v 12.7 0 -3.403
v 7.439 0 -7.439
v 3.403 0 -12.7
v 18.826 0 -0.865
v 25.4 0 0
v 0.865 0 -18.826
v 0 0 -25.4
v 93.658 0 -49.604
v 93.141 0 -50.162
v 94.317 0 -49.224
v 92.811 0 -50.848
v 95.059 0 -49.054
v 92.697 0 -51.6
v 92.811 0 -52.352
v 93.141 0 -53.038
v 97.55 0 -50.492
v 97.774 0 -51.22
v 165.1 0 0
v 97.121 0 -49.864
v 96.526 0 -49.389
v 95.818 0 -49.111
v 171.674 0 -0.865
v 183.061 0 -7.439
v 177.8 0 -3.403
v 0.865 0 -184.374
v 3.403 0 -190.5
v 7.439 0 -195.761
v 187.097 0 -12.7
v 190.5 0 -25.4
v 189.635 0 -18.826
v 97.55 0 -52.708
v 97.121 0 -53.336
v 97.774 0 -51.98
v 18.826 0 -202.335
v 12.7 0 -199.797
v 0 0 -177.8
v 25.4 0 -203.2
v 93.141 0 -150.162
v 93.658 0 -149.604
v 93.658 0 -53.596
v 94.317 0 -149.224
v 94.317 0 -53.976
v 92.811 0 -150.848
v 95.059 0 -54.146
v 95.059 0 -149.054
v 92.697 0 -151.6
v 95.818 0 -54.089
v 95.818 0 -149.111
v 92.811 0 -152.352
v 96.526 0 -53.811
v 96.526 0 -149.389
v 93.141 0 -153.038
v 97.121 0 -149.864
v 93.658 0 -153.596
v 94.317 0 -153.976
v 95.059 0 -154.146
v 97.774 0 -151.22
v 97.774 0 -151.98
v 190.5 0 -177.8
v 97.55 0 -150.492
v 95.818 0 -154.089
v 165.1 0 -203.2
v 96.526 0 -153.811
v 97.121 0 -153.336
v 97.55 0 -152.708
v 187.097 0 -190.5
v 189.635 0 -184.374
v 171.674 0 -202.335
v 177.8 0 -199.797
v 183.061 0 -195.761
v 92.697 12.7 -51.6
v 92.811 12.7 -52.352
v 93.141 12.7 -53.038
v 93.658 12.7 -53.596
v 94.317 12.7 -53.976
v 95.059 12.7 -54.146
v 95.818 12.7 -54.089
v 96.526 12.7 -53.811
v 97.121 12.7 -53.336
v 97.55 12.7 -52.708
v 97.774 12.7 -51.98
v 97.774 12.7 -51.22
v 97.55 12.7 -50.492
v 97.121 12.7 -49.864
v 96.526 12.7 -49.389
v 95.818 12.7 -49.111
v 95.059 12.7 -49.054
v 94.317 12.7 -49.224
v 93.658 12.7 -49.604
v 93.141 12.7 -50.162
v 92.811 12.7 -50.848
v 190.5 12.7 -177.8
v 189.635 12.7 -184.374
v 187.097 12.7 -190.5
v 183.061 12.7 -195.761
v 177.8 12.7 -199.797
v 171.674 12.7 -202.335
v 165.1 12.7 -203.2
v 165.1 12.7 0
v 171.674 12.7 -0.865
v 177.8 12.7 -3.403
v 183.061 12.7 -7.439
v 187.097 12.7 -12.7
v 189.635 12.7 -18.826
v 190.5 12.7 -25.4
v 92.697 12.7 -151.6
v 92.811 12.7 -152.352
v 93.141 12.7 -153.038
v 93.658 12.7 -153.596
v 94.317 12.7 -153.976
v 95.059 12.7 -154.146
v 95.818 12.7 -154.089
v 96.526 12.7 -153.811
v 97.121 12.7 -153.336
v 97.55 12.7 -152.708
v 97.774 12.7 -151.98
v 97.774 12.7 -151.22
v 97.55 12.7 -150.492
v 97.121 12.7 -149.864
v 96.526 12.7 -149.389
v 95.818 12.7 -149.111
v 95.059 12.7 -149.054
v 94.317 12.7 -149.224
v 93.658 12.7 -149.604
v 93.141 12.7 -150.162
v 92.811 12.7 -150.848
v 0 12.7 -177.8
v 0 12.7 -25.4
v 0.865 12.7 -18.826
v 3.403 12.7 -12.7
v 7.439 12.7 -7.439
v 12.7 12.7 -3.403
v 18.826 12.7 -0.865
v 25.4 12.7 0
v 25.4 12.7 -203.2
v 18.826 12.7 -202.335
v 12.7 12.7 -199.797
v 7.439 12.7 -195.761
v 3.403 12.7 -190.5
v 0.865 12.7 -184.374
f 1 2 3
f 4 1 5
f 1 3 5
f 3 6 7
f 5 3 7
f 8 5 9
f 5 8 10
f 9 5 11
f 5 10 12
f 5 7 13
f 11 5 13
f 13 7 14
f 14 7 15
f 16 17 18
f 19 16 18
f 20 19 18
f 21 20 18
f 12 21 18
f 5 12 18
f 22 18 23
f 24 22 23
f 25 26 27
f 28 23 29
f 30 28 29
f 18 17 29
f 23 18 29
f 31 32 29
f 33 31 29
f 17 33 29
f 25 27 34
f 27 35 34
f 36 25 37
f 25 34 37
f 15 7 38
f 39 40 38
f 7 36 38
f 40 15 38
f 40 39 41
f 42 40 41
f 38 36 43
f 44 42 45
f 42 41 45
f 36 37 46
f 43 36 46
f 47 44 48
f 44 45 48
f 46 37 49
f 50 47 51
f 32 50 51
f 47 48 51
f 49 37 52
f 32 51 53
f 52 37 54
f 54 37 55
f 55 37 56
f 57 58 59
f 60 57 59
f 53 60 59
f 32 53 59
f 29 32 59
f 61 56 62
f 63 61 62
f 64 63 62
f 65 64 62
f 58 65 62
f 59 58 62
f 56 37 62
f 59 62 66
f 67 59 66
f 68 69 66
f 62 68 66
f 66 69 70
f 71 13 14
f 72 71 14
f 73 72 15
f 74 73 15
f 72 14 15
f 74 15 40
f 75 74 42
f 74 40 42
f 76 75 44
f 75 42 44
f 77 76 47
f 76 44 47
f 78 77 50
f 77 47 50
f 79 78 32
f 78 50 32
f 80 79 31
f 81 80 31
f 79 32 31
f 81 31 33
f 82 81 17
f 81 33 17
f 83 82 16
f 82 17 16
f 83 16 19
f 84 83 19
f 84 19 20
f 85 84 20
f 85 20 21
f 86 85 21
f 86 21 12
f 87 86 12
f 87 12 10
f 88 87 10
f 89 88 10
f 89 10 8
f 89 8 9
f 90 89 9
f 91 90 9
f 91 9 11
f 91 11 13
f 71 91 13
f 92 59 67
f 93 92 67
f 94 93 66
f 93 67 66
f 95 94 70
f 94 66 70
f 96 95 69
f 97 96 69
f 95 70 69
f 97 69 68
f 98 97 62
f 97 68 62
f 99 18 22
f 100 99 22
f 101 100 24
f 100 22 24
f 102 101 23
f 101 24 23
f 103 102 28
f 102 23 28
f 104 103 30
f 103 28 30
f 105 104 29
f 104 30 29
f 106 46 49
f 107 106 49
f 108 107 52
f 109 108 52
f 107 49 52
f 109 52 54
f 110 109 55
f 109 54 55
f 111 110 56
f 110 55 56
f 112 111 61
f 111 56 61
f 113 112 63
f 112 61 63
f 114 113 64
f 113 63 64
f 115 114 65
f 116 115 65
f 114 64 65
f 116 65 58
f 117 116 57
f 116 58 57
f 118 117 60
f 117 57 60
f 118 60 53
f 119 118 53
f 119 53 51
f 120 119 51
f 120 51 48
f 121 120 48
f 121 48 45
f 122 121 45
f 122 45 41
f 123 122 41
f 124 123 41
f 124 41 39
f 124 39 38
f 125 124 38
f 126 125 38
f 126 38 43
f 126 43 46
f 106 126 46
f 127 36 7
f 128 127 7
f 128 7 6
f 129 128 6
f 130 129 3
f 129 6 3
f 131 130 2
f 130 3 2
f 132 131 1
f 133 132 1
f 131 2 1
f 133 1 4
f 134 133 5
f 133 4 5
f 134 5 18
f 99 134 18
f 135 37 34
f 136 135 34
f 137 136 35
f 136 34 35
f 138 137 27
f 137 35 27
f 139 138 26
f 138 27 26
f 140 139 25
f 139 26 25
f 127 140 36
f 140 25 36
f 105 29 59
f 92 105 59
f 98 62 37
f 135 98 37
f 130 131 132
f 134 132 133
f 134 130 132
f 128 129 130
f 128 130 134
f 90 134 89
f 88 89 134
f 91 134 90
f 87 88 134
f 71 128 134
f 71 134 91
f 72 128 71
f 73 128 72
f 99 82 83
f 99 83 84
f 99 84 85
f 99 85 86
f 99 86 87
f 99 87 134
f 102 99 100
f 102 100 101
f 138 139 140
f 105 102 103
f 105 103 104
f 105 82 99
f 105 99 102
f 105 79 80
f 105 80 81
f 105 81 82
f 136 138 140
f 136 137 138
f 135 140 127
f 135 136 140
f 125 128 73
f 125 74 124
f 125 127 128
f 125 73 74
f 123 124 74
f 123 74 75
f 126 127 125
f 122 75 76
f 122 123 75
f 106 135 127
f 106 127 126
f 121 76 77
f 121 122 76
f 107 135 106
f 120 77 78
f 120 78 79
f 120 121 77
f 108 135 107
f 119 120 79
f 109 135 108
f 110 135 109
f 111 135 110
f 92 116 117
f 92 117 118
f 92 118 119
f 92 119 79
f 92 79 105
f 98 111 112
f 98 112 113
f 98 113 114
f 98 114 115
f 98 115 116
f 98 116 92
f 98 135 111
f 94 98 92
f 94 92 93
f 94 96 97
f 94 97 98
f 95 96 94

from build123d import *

# Parameters (mm, degrees)
BOSS_EXTRUDE1_DEPTH         = 12.7
F_1_4_20_TAPPED_HOLE2_D     = 5.1054
F_1_4_20_TAPPED_HOLE2_DEPTH = 19.05
F_1_4_20_TAPPED_HOLE2_TIP   = 1.533816902


with BuildPart() as part:
    # Sketch1 → Boss-Extrude1 (new body)
    with BuildSketch(Plane(origin=(0, 0, 0), x_dir=(1, 0, 0), z_dir=(0, 1, 0))):
        with BuildLine():
            Line((25.4, 0), (165.1, 0))
            ThreePointArc((165.1, 0), (183.060512242, 7.439487758), (190.5, 25.4))
            Line((190.5, 25.4), (190.5, 177.8))
            ThreePointArc((190.5, 177.8), (183.060512242, 195.760512242), (165.1, 203.2))
            Line((165.1, 203.2), (25.4, 203.2))
            ThreePointArc((25.4, 203.2), (7.439487758, 195.760512242), (0, 177.8))
            Line((0, 177.8), (0, 25.4))
            ThreePointArc((0, 25.4), (7.439487758, 7.439487758), (25.4, 0))
        make_face()
    extrude(amount=BOSS_EXTRUDE1_DEPTH)

    # 1/4-20 Tapped Hole2
    with Locations(Plane(origin=(0, 12.7, 0), x_dir=(1, 0, 0), z_dir=(0, 1, 0))):
        with Locations((95.25, 151.6), (95.25, 51.6)):
            Hole(F_1_4_20_TAPPED_HOLE2_D / 2, depth=F_1_4_20_TAPPED_HOLE2_DEPTH)
            with Locations((0, 0, -(F_1_4_20_TAPPED_HOLE2_DEPTH + F_1_4_20_TAPPED_HOLE2_TIP / 2))):  # 118° drill point
                Cone(0, F_1_4_20_TAPPED_HOLE2_D / 2, F_1_4_20_TAPPED_HOLE2_TIP, mode=Mode.SUBTRACT)


solid = part.part
